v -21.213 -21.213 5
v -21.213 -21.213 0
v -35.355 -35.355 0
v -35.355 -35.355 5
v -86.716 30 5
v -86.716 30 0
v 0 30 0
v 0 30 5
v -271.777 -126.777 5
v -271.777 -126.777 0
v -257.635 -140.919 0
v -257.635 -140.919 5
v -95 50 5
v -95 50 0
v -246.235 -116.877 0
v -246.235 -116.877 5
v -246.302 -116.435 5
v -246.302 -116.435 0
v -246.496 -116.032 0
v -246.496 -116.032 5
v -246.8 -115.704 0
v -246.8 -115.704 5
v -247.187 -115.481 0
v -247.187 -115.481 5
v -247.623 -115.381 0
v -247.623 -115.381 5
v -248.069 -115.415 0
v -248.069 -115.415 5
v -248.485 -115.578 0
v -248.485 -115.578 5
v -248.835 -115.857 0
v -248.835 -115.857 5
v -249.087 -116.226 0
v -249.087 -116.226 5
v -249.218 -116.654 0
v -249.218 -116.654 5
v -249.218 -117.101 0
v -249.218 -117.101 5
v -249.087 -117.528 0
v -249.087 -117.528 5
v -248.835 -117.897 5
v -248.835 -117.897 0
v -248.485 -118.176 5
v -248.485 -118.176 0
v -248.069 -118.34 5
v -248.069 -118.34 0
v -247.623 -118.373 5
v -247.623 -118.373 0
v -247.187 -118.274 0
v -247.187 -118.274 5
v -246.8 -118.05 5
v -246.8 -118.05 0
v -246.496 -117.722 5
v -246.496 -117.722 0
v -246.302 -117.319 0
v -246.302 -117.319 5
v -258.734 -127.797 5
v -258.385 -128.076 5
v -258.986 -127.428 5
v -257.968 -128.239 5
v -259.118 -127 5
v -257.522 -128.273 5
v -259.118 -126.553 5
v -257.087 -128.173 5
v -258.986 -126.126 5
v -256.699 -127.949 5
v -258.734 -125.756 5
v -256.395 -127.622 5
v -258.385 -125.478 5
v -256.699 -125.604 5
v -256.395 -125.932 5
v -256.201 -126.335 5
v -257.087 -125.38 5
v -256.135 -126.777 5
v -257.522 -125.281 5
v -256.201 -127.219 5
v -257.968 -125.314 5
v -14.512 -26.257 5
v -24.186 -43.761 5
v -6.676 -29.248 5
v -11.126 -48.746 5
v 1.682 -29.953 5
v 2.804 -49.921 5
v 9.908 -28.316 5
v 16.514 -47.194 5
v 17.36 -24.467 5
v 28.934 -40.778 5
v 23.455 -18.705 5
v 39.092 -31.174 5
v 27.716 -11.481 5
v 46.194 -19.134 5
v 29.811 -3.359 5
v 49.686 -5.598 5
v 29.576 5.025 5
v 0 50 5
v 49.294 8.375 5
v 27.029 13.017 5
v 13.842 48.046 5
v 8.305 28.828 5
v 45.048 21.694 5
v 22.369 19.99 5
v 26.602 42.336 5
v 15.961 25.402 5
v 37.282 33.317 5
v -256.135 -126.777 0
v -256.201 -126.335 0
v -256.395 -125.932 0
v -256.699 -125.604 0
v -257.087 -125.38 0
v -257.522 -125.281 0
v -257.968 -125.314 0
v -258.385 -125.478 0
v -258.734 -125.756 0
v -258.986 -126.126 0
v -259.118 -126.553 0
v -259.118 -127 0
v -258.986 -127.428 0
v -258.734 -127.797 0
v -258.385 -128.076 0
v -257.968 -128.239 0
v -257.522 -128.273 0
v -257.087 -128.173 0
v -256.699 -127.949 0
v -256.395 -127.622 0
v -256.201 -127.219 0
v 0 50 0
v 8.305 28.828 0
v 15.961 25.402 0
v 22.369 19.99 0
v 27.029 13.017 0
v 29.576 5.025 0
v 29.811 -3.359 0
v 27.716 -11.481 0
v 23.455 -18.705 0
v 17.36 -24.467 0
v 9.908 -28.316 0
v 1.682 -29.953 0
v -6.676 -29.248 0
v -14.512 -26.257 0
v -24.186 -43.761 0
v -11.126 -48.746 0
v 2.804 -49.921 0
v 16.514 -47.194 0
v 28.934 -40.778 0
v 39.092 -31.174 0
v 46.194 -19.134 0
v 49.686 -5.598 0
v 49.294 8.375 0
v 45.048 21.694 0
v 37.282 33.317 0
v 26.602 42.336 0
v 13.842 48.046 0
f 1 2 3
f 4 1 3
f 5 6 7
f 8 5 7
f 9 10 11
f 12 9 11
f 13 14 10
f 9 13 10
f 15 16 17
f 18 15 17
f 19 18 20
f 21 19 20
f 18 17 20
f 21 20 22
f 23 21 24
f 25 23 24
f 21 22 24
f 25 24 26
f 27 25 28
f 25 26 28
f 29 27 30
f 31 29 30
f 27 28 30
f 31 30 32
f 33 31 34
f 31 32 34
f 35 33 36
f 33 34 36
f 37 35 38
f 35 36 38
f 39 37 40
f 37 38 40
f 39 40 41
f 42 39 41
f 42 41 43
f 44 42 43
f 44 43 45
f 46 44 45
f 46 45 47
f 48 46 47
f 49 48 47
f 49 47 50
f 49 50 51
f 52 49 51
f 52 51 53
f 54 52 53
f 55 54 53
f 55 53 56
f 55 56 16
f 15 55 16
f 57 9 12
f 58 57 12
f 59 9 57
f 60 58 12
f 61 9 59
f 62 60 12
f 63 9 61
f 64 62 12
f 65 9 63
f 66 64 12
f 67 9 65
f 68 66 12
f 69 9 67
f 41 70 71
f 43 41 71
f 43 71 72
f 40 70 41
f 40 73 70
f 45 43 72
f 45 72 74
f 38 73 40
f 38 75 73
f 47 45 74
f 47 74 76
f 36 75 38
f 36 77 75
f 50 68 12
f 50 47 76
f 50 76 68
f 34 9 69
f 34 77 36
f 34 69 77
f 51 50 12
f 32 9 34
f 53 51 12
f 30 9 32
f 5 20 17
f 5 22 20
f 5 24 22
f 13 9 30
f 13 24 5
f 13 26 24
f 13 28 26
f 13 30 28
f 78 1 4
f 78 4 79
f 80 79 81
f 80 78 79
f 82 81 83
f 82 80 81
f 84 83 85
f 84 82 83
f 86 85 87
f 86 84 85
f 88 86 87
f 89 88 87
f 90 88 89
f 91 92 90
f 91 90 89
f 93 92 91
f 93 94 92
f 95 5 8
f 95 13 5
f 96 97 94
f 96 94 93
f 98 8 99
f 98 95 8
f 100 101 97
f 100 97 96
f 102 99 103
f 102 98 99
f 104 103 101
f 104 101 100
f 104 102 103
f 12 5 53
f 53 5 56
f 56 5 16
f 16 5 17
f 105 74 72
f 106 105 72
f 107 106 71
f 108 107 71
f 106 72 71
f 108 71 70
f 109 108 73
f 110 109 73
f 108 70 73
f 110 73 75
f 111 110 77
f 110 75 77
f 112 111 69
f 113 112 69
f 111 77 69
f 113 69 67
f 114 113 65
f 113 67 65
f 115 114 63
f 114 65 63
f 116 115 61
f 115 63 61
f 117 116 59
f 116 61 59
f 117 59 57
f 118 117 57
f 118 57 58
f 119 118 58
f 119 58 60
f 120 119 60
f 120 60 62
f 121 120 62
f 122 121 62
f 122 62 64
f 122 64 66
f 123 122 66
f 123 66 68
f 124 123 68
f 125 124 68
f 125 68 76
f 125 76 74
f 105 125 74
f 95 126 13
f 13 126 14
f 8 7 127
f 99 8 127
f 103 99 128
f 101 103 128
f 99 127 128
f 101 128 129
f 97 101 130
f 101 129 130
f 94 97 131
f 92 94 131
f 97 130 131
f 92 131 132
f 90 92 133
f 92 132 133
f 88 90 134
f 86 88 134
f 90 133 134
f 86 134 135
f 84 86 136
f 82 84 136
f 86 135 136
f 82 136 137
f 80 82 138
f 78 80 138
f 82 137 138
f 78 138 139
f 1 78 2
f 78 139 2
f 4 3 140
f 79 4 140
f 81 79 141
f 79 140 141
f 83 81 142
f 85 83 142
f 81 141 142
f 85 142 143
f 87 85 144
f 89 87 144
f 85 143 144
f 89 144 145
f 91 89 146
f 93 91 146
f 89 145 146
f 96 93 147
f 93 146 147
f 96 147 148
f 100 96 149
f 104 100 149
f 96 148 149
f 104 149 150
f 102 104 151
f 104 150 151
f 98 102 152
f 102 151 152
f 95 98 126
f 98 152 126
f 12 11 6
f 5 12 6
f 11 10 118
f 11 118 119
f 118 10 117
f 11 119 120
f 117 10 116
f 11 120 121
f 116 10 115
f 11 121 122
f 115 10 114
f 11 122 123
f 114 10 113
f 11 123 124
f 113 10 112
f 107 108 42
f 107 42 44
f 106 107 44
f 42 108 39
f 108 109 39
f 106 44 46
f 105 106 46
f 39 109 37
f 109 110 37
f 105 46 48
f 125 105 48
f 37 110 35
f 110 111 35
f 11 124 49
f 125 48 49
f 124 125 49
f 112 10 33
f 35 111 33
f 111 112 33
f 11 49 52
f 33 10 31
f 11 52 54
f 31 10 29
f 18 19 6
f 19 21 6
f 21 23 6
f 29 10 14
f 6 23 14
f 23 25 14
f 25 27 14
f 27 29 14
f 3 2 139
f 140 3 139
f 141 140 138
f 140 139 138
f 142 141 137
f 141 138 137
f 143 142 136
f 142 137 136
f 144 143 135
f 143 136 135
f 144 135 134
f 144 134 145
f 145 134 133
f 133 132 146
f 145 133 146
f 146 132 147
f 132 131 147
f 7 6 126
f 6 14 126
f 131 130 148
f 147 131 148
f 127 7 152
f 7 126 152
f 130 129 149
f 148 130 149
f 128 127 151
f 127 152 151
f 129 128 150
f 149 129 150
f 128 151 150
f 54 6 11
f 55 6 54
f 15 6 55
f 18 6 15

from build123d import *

# Parameters (mm, degrees)
EXTRUDE_1_DEPTH     = 5
SKETCH_2_R          = 1.5
CUT_EXTRUDE_1_DEPTH = 307.179177957


with BuildPart() as part:
    # 草图1 → 凸台-拉伸1 (new body)
    with BuildSketch(Plane.XY):
        with BuildLine():
            Line((0, 50), (-95, 50))
            Line((-95, 50), (-271.776695297, -126.776695297))
            Line((-271.776695297, -126.776695297), (-257.634559673, -140.91883092))
            Line((-257.634559673, -140.91883092), (-86.715728753, 30))
            Line((-86.715728753, 30), (0, 30))
            ThreePointArc((0, 30), (27.716385975, -11.480502971), (-21.213203436, -21.213203436))
            Line((-21.213203436, -21.213203436), (-35.355339059, -35.355339059))
            ThreePointArc((-35.355339059, -35.355339059), (46.193976626, -19.134171618), (0, 50))
        make_face()
    extrude(amount=EXTRUDE_1_DEPTH)

    # 草图2 → 切除-拉伸1 (cut, through all)
    with BuildSketch(Plane.XY.offset(5)):
        with Locations((-257.634559673, -126.776695297)):
            Circle(SKETCH_2_R)
        with Locations((-247.735064736, -116.87720036)):
            Circle(SKETCH_2_R)
    extrude(amount=-CUT_EXTRUDE_1_DEPTH, mode=Mode.SUBTRACT)


solid = part.part
